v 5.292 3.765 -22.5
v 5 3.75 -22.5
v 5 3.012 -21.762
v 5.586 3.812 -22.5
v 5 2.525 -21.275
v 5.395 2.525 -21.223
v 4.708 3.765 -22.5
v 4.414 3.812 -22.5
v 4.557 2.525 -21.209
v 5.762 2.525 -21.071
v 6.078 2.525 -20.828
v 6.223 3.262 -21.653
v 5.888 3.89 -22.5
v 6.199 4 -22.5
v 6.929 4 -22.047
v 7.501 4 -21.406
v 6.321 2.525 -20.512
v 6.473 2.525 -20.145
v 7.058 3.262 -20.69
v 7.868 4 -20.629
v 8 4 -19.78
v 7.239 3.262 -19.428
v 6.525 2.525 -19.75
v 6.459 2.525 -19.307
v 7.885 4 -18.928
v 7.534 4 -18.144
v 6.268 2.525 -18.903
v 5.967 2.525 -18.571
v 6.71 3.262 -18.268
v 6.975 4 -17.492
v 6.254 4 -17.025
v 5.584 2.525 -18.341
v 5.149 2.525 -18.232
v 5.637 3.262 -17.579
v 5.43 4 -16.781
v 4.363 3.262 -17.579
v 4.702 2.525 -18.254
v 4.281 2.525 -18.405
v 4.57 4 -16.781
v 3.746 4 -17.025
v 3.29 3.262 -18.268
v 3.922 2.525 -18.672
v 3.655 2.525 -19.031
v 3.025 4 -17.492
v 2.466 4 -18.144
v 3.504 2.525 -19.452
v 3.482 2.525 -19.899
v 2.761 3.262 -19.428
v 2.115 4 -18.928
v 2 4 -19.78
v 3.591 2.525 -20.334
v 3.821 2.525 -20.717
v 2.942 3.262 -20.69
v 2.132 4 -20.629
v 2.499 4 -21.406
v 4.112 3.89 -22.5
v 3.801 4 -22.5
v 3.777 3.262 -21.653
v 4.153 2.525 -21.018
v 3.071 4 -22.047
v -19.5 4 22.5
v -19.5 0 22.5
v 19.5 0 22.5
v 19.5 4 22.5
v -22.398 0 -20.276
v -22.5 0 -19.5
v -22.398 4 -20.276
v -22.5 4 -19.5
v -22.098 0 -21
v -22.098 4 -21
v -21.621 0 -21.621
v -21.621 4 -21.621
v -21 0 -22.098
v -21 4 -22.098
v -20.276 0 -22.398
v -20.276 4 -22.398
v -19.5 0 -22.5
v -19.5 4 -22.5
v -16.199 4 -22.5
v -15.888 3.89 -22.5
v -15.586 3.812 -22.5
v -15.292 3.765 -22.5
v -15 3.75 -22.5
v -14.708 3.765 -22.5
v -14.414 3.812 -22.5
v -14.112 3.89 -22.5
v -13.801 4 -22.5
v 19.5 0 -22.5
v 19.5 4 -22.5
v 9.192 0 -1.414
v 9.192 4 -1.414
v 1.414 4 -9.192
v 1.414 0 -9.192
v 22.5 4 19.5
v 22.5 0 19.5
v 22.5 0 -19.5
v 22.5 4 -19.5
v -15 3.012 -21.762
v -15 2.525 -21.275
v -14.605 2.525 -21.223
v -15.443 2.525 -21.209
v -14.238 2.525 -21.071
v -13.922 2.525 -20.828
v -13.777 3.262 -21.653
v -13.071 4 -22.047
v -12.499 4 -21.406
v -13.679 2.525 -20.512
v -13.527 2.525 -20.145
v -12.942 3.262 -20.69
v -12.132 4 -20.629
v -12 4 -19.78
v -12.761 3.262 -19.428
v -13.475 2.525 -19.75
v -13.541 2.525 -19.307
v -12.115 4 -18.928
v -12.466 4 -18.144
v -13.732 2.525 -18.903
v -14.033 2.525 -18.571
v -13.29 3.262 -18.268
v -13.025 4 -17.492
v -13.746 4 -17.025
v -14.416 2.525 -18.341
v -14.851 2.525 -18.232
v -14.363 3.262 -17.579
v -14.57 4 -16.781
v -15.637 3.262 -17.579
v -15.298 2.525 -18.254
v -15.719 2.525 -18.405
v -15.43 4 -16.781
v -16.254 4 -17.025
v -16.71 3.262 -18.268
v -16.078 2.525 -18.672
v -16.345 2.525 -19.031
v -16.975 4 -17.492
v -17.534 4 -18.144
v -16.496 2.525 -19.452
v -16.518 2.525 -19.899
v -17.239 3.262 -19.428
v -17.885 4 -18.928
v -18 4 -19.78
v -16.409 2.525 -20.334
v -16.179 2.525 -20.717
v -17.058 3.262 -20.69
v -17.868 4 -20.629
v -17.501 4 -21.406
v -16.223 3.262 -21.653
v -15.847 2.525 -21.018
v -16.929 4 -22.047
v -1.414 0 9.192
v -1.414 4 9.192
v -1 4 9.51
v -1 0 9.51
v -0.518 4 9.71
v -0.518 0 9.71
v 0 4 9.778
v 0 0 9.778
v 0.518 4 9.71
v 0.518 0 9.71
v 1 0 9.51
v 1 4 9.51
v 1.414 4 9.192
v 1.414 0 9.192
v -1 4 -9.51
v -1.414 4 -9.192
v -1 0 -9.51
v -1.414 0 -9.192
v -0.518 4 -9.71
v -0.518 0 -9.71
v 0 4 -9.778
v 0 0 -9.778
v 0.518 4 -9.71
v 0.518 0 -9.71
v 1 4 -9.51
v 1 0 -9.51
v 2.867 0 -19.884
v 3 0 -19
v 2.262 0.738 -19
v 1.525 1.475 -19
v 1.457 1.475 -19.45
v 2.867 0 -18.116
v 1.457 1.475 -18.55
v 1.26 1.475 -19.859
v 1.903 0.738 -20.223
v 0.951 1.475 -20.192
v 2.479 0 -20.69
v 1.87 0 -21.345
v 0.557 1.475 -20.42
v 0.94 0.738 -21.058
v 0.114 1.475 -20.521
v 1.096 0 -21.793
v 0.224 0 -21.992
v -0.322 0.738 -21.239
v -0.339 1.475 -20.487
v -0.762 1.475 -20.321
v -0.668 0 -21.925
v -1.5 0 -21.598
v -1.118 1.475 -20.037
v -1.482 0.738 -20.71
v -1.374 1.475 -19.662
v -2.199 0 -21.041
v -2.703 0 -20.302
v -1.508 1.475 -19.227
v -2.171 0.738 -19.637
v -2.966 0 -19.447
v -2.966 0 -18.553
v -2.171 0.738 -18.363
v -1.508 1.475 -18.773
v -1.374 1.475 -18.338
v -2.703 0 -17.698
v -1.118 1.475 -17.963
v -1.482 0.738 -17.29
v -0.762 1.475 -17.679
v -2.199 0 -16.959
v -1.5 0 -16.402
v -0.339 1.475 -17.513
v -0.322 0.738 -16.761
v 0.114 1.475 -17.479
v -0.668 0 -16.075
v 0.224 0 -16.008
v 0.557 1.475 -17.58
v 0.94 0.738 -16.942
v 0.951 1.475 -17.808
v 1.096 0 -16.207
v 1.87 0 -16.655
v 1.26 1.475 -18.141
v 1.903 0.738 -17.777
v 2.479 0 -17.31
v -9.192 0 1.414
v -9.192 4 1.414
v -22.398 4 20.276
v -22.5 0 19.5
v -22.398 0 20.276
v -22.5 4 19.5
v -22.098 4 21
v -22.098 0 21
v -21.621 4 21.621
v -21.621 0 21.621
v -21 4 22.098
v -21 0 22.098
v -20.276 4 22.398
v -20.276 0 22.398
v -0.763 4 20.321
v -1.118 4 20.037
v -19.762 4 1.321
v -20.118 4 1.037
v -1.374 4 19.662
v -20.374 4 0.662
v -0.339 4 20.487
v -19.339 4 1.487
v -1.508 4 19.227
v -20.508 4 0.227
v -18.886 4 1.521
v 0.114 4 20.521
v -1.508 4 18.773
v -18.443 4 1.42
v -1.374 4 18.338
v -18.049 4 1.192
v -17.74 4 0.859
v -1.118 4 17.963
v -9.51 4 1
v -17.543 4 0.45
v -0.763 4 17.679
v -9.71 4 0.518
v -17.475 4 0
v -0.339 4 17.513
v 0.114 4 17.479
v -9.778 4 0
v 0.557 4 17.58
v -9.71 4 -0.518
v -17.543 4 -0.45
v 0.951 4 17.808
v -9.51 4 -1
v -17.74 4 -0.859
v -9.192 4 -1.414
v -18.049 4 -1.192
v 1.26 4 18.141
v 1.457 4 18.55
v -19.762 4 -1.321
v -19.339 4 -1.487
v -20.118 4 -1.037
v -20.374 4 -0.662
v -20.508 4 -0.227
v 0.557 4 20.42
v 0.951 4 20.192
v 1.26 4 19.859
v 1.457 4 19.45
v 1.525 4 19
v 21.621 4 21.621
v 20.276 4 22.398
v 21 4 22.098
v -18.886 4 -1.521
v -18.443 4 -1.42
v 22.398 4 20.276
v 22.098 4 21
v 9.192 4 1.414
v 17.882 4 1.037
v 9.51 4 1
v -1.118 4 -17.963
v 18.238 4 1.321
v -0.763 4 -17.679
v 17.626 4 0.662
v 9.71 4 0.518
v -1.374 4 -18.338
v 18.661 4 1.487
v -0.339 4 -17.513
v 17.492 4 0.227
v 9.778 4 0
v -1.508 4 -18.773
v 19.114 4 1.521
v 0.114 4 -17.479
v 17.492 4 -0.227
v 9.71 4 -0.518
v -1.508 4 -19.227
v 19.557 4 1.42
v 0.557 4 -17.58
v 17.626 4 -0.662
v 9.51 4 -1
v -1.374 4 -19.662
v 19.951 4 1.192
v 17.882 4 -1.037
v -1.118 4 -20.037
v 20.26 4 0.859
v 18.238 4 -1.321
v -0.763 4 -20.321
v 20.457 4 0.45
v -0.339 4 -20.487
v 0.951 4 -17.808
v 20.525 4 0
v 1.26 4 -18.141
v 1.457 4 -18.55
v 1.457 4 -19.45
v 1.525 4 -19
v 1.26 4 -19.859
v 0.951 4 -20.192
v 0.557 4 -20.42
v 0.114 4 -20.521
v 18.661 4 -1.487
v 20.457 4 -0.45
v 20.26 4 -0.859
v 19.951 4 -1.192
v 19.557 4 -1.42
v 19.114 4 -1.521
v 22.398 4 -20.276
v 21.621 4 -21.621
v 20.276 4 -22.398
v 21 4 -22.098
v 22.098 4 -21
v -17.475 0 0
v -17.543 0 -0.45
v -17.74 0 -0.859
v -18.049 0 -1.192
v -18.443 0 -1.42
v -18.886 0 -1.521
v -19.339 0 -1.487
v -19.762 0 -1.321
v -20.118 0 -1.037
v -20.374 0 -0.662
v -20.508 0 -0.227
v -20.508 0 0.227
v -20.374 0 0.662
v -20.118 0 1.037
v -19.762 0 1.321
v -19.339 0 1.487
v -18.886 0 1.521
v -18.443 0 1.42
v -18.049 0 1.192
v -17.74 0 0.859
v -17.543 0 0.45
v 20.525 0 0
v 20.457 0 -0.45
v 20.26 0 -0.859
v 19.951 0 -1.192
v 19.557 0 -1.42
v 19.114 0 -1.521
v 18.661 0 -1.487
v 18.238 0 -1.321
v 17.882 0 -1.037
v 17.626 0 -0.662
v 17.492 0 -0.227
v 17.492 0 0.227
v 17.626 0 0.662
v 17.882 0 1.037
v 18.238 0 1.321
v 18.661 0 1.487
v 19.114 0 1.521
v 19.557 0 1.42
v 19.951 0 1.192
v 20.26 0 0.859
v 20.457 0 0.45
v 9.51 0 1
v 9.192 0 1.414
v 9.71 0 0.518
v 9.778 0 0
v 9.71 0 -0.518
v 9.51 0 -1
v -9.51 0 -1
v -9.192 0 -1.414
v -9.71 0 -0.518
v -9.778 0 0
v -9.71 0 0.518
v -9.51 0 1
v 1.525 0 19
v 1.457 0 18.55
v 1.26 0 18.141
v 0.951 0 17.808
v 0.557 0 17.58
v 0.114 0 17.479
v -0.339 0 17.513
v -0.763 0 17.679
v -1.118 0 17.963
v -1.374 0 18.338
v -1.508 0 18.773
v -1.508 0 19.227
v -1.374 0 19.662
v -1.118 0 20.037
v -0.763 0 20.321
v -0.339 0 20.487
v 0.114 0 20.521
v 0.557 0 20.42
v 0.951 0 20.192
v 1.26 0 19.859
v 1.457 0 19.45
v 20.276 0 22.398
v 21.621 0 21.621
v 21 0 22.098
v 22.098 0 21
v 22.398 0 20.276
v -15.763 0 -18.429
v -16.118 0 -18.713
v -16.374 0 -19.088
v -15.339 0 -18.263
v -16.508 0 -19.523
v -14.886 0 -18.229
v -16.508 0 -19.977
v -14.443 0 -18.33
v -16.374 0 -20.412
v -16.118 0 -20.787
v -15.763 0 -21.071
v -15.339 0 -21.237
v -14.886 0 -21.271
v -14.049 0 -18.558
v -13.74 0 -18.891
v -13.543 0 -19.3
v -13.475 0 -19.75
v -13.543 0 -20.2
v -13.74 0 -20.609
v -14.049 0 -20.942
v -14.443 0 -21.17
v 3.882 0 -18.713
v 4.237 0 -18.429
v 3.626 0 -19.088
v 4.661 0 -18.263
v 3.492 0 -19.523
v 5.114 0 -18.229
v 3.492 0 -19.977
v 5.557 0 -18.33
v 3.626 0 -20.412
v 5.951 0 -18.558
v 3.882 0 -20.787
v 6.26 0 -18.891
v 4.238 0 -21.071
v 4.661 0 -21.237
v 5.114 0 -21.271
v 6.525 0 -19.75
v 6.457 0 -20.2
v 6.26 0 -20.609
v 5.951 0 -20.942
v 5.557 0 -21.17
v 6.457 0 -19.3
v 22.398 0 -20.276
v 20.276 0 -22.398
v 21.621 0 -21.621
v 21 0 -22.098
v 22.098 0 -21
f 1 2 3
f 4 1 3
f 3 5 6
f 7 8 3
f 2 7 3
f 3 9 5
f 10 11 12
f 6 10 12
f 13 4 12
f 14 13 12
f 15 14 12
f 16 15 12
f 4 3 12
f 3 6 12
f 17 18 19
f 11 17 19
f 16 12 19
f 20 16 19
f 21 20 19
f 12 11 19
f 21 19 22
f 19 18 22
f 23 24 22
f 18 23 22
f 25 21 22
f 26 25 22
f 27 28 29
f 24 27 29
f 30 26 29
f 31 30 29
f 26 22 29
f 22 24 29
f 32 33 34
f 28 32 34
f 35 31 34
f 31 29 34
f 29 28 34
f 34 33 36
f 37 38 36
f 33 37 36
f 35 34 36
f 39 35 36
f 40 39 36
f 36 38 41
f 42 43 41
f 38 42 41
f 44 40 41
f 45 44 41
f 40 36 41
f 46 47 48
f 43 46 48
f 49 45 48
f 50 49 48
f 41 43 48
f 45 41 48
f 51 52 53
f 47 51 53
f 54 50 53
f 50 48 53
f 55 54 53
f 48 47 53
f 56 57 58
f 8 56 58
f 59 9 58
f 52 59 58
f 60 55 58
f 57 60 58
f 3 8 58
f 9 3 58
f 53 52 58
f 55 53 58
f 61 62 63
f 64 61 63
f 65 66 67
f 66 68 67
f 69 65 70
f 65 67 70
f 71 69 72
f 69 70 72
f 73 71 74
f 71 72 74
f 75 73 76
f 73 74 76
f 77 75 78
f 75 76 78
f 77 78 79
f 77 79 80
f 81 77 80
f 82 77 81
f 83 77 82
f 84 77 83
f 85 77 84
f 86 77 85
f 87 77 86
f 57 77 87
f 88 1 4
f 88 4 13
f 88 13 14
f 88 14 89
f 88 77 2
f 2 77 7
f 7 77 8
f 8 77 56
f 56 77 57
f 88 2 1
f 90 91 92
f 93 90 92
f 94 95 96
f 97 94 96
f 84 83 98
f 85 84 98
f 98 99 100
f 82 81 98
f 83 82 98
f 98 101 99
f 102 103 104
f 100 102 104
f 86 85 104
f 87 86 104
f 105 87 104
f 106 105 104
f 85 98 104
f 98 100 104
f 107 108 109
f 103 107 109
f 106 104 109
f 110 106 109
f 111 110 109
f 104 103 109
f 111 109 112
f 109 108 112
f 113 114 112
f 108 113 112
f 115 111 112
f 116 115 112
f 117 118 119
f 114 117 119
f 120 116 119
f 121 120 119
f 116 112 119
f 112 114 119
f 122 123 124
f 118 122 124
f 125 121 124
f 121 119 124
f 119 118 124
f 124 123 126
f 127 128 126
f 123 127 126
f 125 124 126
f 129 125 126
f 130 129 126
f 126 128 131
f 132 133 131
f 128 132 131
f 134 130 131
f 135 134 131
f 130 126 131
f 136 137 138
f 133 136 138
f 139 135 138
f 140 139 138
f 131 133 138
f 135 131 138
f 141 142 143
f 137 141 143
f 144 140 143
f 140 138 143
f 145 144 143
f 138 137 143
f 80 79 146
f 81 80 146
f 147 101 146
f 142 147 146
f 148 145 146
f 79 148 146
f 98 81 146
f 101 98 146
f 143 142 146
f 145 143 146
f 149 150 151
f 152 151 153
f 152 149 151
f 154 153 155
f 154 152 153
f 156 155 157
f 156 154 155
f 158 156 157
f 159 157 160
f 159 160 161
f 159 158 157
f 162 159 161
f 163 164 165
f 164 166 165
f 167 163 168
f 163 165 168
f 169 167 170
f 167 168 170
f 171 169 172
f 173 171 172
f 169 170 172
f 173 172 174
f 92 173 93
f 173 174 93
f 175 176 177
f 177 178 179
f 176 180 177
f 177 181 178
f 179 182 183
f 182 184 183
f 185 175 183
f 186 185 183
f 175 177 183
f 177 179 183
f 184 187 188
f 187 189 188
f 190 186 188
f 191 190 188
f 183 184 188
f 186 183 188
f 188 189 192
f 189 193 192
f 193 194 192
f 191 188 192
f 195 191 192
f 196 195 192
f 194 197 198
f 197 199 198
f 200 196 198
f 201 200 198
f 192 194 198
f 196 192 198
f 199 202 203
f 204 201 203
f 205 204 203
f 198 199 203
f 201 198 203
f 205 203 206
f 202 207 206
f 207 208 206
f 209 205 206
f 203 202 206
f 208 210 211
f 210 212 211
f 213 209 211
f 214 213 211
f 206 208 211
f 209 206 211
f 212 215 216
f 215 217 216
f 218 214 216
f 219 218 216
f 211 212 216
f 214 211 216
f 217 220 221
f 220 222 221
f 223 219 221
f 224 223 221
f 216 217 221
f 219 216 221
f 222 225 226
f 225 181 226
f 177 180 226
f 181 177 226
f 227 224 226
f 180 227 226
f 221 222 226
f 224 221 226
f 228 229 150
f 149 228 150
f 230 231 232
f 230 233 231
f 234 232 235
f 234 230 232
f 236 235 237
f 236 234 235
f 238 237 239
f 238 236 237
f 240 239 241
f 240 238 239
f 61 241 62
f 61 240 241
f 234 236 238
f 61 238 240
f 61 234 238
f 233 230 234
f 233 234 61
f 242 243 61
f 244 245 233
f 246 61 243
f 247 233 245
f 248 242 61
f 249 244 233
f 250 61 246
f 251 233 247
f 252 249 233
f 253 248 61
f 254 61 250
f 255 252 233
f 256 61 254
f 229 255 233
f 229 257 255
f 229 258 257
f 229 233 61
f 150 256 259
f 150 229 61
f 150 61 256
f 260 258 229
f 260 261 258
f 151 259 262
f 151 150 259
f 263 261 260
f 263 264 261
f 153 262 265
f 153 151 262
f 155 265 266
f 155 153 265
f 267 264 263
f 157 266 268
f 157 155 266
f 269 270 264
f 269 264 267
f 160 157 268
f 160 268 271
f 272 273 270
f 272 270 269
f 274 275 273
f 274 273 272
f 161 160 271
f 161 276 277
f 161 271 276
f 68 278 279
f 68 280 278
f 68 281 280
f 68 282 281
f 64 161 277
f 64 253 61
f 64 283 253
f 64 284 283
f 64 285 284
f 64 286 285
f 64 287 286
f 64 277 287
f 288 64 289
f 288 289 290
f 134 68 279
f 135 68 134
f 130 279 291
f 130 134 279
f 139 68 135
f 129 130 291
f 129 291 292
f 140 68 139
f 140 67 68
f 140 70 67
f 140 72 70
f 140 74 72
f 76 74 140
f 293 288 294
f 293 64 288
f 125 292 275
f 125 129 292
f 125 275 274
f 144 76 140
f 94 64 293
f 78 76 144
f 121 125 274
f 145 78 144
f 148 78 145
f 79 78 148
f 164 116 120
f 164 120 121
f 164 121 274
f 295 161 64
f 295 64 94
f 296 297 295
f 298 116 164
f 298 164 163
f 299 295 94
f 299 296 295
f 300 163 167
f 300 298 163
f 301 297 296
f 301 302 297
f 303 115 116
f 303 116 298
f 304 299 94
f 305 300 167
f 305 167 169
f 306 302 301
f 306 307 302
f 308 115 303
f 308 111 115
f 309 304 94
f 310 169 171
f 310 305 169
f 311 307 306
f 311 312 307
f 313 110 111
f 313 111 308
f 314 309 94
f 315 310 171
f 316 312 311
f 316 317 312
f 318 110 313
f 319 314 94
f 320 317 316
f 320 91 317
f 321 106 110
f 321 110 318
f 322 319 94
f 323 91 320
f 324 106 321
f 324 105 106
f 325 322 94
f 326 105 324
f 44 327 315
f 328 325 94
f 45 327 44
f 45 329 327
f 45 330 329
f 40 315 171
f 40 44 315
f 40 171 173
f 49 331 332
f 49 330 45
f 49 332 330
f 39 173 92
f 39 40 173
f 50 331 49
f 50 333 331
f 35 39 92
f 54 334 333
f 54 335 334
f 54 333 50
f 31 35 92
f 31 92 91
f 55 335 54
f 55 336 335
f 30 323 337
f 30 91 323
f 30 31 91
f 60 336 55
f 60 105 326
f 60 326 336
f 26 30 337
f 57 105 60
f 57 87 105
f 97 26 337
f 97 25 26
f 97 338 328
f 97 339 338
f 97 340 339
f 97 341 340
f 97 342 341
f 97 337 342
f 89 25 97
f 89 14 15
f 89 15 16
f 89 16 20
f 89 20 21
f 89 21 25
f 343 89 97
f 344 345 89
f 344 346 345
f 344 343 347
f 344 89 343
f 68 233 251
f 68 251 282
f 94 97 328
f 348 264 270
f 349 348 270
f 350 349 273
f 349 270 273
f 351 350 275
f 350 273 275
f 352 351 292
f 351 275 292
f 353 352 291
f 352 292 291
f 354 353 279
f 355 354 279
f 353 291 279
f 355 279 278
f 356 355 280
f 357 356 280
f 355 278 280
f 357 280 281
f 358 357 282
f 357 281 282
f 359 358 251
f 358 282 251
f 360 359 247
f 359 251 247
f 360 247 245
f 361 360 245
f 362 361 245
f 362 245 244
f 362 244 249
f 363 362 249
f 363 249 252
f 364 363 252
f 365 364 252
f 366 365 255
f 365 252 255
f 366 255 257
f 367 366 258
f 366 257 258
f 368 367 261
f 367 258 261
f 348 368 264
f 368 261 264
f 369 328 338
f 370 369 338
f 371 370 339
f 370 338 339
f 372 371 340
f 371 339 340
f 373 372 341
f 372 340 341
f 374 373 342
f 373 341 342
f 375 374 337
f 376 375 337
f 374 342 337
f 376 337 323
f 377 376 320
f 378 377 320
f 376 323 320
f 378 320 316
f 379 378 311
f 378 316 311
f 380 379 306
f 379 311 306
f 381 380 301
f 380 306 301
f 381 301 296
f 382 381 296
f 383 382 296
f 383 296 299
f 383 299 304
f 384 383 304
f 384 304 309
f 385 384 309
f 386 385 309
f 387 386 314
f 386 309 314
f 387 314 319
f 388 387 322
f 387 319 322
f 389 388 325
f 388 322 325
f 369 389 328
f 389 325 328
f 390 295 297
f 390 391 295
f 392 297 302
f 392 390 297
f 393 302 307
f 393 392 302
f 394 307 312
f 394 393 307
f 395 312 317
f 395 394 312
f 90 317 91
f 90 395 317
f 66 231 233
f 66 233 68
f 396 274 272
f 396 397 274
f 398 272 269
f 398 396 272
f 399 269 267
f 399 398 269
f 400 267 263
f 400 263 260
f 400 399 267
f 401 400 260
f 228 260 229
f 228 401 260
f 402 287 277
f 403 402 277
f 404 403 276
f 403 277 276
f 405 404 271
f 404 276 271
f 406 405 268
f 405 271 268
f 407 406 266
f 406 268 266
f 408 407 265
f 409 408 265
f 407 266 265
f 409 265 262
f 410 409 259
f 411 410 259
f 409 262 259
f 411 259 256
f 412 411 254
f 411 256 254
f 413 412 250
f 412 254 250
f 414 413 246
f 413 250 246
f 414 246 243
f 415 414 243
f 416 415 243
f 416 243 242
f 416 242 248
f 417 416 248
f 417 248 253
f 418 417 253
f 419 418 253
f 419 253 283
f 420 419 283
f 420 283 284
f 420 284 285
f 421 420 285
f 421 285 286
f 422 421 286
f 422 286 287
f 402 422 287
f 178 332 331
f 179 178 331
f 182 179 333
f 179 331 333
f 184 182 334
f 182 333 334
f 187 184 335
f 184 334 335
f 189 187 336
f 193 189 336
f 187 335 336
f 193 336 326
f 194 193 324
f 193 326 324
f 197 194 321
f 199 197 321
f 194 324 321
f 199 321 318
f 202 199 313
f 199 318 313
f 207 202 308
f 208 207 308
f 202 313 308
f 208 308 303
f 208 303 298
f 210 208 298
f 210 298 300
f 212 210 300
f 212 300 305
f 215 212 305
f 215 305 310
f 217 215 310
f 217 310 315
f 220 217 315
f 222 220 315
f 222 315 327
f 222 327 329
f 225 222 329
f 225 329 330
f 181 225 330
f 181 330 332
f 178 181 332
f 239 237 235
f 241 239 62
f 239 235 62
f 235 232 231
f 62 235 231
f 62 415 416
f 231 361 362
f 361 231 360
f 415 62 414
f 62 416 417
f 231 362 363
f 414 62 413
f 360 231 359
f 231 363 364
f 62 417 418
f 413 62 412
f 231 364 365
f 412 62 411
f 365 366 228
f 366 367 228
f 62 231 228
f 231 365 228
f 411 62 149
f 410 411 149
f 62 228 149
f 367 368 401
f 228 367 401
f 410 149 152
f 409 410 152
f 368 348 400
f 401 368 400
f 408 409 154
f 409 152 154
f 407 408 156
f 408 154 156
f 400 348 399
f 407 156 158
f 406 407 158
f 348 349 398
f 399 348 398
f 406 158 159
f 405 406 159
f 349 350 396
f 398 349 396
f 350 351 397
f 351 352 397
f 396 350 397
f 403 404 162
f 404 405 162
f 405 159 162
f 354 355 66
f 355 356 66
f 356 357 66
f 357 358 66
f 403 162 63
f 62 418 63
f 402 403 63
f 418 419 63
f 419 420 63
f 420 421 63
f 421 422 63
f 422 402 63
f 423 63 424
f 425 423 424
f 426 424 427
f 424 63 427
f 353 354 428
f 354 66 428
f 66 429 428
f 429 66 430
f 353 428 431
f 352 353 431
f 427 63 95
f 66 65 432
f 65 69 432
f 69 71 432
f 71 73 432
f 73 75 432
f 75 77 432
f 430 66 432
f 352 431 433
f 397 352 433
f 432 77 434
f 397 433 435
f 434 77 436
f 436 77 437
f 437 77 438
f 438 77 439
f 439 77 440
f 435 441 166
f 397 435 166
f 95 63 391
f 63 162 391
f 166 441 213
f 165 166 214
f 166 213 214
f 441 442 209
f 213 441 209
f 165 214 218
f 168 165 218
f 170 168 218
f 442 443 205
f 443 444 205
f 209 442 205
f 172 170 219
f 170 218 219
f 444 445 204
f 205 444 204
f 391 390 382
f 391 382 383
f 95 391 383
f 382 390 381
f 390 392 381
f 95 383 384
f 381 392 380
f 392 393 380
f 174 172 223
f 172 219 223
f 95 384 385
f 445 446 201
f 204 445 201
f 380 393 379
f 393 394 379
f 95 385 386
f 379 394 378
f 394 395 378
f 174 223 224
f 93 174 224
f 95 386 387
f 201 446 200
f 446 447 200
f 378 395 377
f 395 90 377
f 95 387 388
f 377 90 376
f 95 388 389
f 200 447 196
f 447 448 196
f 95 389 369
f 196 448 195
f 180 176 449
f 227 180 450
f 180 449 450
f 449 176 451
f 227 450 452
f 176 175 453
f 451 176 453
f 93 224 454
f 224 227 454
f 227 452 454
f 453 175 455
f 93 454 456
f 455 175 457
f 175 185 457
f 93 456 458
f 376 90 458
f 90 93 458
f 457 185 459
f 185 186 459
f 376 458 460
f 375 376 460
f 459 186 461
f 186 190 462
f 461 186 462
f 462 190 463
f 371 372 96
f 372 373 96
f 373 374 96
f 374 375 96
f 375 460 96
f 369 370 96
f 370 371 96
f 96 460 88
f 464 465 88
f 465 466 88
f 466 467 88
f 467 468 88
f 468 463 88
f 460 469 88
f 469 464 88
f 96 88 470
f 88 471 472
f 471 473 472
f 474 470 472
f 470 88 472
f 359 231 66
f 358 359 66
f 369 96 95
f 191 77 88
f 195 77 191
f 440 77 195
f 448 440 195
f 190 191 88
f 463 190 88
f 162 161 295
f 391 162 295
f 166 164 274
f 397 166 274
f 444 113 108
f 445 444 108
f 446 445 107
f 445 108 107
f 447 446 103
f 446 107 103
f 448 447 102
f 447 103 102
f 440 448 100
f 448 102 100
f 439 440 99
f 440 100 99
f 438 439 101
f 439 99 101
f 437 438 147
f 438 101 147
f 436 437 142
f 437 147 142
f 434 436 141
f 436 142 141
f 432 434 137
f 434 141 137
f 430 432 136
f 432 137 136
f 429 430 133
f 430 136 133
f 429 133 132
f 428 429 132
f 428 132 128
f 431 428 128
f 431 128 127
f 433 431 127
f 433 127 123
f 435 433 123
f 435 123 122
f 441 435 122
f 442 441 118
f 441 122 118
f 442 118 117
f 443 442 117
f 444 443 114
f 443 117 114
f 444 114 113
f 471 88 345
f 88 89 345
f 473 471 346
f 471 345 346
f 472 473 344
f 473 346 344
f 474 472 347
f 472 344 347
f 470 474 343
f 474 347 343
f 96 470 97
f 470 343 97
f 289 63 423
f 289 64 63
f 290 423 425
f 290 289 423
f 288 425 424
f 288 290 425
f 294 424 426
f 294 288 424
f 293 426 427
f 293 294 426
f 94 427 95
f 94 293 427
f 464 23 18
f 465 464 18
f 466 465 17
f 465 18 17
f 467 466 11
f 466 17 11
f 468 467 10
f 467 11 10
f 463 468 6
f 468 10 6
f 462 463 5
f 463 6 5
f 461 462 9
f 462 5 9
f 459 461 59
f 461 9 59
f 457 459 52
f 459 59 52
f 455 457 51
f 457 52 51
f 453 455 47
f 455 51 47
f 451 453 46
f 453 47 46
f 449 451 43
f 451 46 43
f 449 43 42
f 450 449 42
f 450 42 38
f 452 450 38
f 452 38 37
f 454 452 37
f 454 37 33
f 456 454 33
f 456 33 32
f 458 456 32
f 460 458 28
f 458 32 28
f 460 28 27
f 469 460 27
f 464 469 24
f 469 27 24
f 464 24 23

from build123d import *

# Parameters (mm, degrees)
SKETCH_1_W                = 45
SKETCH_1_H                = 45
EXTRUDE_1_DEPTH           = 4
SKETCH_2_R                = 1.525
CUT_EXTRUDE_1_DEPTH       = 4
FILLET_1_R                = 3
HOLE_WIZARD_1_D           = 3
HOLE_WIZARD_1_CSINK_D     = 6
HOLE_WIZARD_1_CSINK_ANGLE = 90
SKETCH_5_R                = 1.525
CUT_EXTRUDE_2_DEPTH       = 10
HOLE_WIZARD_2_D           = 3
HOLE_WIZARD_2_CSINK_D     = 6
HOLE_WIZARD_2_CSINK_ANGLE = 90
CUT_EXTRUDE_3_DEPTH       = 1
CUT_EXTRUDE_3_DEPTH_BACK  = 5
FILLET_2_R                = 2
SKETCH_3_R                = 1.525
CUT_EXTRUDE_4_DEPTH       = 1
CUT_EXTRUDE_4_DEPTH_BACK  = 5


with BuildPart() as part:
    # 草图1 → 凸台-拉伸1 (new body)
    with BuildSketch(Plane(origin=(0, 0, 0), x_dir=(1, 0, 0), z_dir=(0, 1, 0))):
        Rectangle(SKETCH_1_W, SKETCH_1_H)
    extrude(amount=EXTRUDE_1_DEPTH)

    # 草图2 → 切除-拉伸1 (cut)
    with BuildSketch(Plane(origin=(0, 4, 0), x_dir=(1, 0, 0), z_dir=(0, 1, 0))):
        with Locations((-19, 0)):
            Circle(SKETCH_2_R)
        with Locations((19, 0)):
            Circle(SKETCH_2_R)
    extrude(amount=-CUT_EXTRUDE_1_DEPTH, mode=Mode.SUBTRACT)

    # 圆角1
    fillet_1_edges = [part.edges().sort_by_distance(p)[0] for p in [
        (22.5, 2, 22.5),
        (-22.5, 2, 22.5),
        (-22.5, 2, -22.5),
        (22.5, 2, -22.5),
    ]]
    fillet(fillet_1_edges, radius=FILLET_1_R)

    # 孔1 (through all)
    with Locations(Plane(origin=(-15, 4, -19.75), x_dir=(0, 0, 1), z_dir=(0, 1, 0))):
        with Locations((0, 0), (0, 20)):
            CounterSinkHole(HOLE_WIZARD_1_D / 2, HOLE_WIZARD_1_CSINK_D / 2, counter_sink_angle=HOLE_WIZARD_1_CSINK_ANGLE)

    # 草图5 → 切除-拉伸2 (cut)
    with BuildSketch(Plane(origin=(0, 4, 0), x_dir=(1, 0, 0), z_dir=(0, 1, 0))):
        with Locations((0, 19)):
            Circle(SKETCH_5_R)
        with Locations((0, -19)):
            Circle(SKETCH_5_R)
    extrude(amount=-CUT_EXTRUDE_2_DEPTH, mode=Mode.SUBTRACT)

    # 孔2 (through all)
    with Locations(Plane(origin=(0, 0, 0), x_dir=(-1, 0, 0), z_dir=(0, -1, 0))):
        with Locations((0, 19)):
            CounterSinkHole(HOLE_WIZARD_2_D / 2, HOLE_WIZARD_2_CSINK_D / 2, counter_sink_angle=HOLE_WIZARD_2_CSINK_ANGLE)

    # 草图8 → 切除-拉伸3 (cut, two sides)
    with BuildSketch(Plane(origin=(0, 4, 0), x_dir=(1, 0, 0), z_dir=(0, 1, 0))) as cut_extrude_3_sk:
        Polygon((0, 10.606601718), (-10.606601718, 0), (0, -10.606601718), (10.606601718, 0), align=None)
    extrude(amount=CUT_EXTRUDE_3_DEPTH, mode=Mode.SUBTRACT)
    extrude(cut_extrude_3_sk.sketch, amount=-CUT_EXTRUDE_3_DEPTH_BACK, mode=Mode.SUBTRACT)

    # 圆角2
    fillet_2_edges = [part.edges().sort_by_distance(p)[0] for p in [
        (0, 2, -10.606601718),
        (10.606601718, 2, 0),
        (0, 2, 10.606601718),
        (-10.606601718, 2, 0),
    ]]
    fillet(fillet_2_edges, radius=FILLET_2_R)

    # 草图3 → 切除-拉伸4 (cut, two sides)
    with BuildSketch(Plane(origin=(0, 4, 0), x_dir=(1, 0, 0), z_dir=(0, 1, 0))) as cut_extrude_4_sk:
        with Locations((5, 19.75)):
            Circle(SKETCH_3_R)
        with Locations((-15, 19.75)):
            Circle(SKETCH_3_R)
    extrude(amount=CUT_EXTRUDE_4_DEPTH, mode=Mode.SUBTRACT)
    extrude(cut_extrude_4_sk.sketch, amount=-CUT_EXTRUDE_4_DEPTH_BACK, mode=Mode.SUBTRACT)


solid = part.part
